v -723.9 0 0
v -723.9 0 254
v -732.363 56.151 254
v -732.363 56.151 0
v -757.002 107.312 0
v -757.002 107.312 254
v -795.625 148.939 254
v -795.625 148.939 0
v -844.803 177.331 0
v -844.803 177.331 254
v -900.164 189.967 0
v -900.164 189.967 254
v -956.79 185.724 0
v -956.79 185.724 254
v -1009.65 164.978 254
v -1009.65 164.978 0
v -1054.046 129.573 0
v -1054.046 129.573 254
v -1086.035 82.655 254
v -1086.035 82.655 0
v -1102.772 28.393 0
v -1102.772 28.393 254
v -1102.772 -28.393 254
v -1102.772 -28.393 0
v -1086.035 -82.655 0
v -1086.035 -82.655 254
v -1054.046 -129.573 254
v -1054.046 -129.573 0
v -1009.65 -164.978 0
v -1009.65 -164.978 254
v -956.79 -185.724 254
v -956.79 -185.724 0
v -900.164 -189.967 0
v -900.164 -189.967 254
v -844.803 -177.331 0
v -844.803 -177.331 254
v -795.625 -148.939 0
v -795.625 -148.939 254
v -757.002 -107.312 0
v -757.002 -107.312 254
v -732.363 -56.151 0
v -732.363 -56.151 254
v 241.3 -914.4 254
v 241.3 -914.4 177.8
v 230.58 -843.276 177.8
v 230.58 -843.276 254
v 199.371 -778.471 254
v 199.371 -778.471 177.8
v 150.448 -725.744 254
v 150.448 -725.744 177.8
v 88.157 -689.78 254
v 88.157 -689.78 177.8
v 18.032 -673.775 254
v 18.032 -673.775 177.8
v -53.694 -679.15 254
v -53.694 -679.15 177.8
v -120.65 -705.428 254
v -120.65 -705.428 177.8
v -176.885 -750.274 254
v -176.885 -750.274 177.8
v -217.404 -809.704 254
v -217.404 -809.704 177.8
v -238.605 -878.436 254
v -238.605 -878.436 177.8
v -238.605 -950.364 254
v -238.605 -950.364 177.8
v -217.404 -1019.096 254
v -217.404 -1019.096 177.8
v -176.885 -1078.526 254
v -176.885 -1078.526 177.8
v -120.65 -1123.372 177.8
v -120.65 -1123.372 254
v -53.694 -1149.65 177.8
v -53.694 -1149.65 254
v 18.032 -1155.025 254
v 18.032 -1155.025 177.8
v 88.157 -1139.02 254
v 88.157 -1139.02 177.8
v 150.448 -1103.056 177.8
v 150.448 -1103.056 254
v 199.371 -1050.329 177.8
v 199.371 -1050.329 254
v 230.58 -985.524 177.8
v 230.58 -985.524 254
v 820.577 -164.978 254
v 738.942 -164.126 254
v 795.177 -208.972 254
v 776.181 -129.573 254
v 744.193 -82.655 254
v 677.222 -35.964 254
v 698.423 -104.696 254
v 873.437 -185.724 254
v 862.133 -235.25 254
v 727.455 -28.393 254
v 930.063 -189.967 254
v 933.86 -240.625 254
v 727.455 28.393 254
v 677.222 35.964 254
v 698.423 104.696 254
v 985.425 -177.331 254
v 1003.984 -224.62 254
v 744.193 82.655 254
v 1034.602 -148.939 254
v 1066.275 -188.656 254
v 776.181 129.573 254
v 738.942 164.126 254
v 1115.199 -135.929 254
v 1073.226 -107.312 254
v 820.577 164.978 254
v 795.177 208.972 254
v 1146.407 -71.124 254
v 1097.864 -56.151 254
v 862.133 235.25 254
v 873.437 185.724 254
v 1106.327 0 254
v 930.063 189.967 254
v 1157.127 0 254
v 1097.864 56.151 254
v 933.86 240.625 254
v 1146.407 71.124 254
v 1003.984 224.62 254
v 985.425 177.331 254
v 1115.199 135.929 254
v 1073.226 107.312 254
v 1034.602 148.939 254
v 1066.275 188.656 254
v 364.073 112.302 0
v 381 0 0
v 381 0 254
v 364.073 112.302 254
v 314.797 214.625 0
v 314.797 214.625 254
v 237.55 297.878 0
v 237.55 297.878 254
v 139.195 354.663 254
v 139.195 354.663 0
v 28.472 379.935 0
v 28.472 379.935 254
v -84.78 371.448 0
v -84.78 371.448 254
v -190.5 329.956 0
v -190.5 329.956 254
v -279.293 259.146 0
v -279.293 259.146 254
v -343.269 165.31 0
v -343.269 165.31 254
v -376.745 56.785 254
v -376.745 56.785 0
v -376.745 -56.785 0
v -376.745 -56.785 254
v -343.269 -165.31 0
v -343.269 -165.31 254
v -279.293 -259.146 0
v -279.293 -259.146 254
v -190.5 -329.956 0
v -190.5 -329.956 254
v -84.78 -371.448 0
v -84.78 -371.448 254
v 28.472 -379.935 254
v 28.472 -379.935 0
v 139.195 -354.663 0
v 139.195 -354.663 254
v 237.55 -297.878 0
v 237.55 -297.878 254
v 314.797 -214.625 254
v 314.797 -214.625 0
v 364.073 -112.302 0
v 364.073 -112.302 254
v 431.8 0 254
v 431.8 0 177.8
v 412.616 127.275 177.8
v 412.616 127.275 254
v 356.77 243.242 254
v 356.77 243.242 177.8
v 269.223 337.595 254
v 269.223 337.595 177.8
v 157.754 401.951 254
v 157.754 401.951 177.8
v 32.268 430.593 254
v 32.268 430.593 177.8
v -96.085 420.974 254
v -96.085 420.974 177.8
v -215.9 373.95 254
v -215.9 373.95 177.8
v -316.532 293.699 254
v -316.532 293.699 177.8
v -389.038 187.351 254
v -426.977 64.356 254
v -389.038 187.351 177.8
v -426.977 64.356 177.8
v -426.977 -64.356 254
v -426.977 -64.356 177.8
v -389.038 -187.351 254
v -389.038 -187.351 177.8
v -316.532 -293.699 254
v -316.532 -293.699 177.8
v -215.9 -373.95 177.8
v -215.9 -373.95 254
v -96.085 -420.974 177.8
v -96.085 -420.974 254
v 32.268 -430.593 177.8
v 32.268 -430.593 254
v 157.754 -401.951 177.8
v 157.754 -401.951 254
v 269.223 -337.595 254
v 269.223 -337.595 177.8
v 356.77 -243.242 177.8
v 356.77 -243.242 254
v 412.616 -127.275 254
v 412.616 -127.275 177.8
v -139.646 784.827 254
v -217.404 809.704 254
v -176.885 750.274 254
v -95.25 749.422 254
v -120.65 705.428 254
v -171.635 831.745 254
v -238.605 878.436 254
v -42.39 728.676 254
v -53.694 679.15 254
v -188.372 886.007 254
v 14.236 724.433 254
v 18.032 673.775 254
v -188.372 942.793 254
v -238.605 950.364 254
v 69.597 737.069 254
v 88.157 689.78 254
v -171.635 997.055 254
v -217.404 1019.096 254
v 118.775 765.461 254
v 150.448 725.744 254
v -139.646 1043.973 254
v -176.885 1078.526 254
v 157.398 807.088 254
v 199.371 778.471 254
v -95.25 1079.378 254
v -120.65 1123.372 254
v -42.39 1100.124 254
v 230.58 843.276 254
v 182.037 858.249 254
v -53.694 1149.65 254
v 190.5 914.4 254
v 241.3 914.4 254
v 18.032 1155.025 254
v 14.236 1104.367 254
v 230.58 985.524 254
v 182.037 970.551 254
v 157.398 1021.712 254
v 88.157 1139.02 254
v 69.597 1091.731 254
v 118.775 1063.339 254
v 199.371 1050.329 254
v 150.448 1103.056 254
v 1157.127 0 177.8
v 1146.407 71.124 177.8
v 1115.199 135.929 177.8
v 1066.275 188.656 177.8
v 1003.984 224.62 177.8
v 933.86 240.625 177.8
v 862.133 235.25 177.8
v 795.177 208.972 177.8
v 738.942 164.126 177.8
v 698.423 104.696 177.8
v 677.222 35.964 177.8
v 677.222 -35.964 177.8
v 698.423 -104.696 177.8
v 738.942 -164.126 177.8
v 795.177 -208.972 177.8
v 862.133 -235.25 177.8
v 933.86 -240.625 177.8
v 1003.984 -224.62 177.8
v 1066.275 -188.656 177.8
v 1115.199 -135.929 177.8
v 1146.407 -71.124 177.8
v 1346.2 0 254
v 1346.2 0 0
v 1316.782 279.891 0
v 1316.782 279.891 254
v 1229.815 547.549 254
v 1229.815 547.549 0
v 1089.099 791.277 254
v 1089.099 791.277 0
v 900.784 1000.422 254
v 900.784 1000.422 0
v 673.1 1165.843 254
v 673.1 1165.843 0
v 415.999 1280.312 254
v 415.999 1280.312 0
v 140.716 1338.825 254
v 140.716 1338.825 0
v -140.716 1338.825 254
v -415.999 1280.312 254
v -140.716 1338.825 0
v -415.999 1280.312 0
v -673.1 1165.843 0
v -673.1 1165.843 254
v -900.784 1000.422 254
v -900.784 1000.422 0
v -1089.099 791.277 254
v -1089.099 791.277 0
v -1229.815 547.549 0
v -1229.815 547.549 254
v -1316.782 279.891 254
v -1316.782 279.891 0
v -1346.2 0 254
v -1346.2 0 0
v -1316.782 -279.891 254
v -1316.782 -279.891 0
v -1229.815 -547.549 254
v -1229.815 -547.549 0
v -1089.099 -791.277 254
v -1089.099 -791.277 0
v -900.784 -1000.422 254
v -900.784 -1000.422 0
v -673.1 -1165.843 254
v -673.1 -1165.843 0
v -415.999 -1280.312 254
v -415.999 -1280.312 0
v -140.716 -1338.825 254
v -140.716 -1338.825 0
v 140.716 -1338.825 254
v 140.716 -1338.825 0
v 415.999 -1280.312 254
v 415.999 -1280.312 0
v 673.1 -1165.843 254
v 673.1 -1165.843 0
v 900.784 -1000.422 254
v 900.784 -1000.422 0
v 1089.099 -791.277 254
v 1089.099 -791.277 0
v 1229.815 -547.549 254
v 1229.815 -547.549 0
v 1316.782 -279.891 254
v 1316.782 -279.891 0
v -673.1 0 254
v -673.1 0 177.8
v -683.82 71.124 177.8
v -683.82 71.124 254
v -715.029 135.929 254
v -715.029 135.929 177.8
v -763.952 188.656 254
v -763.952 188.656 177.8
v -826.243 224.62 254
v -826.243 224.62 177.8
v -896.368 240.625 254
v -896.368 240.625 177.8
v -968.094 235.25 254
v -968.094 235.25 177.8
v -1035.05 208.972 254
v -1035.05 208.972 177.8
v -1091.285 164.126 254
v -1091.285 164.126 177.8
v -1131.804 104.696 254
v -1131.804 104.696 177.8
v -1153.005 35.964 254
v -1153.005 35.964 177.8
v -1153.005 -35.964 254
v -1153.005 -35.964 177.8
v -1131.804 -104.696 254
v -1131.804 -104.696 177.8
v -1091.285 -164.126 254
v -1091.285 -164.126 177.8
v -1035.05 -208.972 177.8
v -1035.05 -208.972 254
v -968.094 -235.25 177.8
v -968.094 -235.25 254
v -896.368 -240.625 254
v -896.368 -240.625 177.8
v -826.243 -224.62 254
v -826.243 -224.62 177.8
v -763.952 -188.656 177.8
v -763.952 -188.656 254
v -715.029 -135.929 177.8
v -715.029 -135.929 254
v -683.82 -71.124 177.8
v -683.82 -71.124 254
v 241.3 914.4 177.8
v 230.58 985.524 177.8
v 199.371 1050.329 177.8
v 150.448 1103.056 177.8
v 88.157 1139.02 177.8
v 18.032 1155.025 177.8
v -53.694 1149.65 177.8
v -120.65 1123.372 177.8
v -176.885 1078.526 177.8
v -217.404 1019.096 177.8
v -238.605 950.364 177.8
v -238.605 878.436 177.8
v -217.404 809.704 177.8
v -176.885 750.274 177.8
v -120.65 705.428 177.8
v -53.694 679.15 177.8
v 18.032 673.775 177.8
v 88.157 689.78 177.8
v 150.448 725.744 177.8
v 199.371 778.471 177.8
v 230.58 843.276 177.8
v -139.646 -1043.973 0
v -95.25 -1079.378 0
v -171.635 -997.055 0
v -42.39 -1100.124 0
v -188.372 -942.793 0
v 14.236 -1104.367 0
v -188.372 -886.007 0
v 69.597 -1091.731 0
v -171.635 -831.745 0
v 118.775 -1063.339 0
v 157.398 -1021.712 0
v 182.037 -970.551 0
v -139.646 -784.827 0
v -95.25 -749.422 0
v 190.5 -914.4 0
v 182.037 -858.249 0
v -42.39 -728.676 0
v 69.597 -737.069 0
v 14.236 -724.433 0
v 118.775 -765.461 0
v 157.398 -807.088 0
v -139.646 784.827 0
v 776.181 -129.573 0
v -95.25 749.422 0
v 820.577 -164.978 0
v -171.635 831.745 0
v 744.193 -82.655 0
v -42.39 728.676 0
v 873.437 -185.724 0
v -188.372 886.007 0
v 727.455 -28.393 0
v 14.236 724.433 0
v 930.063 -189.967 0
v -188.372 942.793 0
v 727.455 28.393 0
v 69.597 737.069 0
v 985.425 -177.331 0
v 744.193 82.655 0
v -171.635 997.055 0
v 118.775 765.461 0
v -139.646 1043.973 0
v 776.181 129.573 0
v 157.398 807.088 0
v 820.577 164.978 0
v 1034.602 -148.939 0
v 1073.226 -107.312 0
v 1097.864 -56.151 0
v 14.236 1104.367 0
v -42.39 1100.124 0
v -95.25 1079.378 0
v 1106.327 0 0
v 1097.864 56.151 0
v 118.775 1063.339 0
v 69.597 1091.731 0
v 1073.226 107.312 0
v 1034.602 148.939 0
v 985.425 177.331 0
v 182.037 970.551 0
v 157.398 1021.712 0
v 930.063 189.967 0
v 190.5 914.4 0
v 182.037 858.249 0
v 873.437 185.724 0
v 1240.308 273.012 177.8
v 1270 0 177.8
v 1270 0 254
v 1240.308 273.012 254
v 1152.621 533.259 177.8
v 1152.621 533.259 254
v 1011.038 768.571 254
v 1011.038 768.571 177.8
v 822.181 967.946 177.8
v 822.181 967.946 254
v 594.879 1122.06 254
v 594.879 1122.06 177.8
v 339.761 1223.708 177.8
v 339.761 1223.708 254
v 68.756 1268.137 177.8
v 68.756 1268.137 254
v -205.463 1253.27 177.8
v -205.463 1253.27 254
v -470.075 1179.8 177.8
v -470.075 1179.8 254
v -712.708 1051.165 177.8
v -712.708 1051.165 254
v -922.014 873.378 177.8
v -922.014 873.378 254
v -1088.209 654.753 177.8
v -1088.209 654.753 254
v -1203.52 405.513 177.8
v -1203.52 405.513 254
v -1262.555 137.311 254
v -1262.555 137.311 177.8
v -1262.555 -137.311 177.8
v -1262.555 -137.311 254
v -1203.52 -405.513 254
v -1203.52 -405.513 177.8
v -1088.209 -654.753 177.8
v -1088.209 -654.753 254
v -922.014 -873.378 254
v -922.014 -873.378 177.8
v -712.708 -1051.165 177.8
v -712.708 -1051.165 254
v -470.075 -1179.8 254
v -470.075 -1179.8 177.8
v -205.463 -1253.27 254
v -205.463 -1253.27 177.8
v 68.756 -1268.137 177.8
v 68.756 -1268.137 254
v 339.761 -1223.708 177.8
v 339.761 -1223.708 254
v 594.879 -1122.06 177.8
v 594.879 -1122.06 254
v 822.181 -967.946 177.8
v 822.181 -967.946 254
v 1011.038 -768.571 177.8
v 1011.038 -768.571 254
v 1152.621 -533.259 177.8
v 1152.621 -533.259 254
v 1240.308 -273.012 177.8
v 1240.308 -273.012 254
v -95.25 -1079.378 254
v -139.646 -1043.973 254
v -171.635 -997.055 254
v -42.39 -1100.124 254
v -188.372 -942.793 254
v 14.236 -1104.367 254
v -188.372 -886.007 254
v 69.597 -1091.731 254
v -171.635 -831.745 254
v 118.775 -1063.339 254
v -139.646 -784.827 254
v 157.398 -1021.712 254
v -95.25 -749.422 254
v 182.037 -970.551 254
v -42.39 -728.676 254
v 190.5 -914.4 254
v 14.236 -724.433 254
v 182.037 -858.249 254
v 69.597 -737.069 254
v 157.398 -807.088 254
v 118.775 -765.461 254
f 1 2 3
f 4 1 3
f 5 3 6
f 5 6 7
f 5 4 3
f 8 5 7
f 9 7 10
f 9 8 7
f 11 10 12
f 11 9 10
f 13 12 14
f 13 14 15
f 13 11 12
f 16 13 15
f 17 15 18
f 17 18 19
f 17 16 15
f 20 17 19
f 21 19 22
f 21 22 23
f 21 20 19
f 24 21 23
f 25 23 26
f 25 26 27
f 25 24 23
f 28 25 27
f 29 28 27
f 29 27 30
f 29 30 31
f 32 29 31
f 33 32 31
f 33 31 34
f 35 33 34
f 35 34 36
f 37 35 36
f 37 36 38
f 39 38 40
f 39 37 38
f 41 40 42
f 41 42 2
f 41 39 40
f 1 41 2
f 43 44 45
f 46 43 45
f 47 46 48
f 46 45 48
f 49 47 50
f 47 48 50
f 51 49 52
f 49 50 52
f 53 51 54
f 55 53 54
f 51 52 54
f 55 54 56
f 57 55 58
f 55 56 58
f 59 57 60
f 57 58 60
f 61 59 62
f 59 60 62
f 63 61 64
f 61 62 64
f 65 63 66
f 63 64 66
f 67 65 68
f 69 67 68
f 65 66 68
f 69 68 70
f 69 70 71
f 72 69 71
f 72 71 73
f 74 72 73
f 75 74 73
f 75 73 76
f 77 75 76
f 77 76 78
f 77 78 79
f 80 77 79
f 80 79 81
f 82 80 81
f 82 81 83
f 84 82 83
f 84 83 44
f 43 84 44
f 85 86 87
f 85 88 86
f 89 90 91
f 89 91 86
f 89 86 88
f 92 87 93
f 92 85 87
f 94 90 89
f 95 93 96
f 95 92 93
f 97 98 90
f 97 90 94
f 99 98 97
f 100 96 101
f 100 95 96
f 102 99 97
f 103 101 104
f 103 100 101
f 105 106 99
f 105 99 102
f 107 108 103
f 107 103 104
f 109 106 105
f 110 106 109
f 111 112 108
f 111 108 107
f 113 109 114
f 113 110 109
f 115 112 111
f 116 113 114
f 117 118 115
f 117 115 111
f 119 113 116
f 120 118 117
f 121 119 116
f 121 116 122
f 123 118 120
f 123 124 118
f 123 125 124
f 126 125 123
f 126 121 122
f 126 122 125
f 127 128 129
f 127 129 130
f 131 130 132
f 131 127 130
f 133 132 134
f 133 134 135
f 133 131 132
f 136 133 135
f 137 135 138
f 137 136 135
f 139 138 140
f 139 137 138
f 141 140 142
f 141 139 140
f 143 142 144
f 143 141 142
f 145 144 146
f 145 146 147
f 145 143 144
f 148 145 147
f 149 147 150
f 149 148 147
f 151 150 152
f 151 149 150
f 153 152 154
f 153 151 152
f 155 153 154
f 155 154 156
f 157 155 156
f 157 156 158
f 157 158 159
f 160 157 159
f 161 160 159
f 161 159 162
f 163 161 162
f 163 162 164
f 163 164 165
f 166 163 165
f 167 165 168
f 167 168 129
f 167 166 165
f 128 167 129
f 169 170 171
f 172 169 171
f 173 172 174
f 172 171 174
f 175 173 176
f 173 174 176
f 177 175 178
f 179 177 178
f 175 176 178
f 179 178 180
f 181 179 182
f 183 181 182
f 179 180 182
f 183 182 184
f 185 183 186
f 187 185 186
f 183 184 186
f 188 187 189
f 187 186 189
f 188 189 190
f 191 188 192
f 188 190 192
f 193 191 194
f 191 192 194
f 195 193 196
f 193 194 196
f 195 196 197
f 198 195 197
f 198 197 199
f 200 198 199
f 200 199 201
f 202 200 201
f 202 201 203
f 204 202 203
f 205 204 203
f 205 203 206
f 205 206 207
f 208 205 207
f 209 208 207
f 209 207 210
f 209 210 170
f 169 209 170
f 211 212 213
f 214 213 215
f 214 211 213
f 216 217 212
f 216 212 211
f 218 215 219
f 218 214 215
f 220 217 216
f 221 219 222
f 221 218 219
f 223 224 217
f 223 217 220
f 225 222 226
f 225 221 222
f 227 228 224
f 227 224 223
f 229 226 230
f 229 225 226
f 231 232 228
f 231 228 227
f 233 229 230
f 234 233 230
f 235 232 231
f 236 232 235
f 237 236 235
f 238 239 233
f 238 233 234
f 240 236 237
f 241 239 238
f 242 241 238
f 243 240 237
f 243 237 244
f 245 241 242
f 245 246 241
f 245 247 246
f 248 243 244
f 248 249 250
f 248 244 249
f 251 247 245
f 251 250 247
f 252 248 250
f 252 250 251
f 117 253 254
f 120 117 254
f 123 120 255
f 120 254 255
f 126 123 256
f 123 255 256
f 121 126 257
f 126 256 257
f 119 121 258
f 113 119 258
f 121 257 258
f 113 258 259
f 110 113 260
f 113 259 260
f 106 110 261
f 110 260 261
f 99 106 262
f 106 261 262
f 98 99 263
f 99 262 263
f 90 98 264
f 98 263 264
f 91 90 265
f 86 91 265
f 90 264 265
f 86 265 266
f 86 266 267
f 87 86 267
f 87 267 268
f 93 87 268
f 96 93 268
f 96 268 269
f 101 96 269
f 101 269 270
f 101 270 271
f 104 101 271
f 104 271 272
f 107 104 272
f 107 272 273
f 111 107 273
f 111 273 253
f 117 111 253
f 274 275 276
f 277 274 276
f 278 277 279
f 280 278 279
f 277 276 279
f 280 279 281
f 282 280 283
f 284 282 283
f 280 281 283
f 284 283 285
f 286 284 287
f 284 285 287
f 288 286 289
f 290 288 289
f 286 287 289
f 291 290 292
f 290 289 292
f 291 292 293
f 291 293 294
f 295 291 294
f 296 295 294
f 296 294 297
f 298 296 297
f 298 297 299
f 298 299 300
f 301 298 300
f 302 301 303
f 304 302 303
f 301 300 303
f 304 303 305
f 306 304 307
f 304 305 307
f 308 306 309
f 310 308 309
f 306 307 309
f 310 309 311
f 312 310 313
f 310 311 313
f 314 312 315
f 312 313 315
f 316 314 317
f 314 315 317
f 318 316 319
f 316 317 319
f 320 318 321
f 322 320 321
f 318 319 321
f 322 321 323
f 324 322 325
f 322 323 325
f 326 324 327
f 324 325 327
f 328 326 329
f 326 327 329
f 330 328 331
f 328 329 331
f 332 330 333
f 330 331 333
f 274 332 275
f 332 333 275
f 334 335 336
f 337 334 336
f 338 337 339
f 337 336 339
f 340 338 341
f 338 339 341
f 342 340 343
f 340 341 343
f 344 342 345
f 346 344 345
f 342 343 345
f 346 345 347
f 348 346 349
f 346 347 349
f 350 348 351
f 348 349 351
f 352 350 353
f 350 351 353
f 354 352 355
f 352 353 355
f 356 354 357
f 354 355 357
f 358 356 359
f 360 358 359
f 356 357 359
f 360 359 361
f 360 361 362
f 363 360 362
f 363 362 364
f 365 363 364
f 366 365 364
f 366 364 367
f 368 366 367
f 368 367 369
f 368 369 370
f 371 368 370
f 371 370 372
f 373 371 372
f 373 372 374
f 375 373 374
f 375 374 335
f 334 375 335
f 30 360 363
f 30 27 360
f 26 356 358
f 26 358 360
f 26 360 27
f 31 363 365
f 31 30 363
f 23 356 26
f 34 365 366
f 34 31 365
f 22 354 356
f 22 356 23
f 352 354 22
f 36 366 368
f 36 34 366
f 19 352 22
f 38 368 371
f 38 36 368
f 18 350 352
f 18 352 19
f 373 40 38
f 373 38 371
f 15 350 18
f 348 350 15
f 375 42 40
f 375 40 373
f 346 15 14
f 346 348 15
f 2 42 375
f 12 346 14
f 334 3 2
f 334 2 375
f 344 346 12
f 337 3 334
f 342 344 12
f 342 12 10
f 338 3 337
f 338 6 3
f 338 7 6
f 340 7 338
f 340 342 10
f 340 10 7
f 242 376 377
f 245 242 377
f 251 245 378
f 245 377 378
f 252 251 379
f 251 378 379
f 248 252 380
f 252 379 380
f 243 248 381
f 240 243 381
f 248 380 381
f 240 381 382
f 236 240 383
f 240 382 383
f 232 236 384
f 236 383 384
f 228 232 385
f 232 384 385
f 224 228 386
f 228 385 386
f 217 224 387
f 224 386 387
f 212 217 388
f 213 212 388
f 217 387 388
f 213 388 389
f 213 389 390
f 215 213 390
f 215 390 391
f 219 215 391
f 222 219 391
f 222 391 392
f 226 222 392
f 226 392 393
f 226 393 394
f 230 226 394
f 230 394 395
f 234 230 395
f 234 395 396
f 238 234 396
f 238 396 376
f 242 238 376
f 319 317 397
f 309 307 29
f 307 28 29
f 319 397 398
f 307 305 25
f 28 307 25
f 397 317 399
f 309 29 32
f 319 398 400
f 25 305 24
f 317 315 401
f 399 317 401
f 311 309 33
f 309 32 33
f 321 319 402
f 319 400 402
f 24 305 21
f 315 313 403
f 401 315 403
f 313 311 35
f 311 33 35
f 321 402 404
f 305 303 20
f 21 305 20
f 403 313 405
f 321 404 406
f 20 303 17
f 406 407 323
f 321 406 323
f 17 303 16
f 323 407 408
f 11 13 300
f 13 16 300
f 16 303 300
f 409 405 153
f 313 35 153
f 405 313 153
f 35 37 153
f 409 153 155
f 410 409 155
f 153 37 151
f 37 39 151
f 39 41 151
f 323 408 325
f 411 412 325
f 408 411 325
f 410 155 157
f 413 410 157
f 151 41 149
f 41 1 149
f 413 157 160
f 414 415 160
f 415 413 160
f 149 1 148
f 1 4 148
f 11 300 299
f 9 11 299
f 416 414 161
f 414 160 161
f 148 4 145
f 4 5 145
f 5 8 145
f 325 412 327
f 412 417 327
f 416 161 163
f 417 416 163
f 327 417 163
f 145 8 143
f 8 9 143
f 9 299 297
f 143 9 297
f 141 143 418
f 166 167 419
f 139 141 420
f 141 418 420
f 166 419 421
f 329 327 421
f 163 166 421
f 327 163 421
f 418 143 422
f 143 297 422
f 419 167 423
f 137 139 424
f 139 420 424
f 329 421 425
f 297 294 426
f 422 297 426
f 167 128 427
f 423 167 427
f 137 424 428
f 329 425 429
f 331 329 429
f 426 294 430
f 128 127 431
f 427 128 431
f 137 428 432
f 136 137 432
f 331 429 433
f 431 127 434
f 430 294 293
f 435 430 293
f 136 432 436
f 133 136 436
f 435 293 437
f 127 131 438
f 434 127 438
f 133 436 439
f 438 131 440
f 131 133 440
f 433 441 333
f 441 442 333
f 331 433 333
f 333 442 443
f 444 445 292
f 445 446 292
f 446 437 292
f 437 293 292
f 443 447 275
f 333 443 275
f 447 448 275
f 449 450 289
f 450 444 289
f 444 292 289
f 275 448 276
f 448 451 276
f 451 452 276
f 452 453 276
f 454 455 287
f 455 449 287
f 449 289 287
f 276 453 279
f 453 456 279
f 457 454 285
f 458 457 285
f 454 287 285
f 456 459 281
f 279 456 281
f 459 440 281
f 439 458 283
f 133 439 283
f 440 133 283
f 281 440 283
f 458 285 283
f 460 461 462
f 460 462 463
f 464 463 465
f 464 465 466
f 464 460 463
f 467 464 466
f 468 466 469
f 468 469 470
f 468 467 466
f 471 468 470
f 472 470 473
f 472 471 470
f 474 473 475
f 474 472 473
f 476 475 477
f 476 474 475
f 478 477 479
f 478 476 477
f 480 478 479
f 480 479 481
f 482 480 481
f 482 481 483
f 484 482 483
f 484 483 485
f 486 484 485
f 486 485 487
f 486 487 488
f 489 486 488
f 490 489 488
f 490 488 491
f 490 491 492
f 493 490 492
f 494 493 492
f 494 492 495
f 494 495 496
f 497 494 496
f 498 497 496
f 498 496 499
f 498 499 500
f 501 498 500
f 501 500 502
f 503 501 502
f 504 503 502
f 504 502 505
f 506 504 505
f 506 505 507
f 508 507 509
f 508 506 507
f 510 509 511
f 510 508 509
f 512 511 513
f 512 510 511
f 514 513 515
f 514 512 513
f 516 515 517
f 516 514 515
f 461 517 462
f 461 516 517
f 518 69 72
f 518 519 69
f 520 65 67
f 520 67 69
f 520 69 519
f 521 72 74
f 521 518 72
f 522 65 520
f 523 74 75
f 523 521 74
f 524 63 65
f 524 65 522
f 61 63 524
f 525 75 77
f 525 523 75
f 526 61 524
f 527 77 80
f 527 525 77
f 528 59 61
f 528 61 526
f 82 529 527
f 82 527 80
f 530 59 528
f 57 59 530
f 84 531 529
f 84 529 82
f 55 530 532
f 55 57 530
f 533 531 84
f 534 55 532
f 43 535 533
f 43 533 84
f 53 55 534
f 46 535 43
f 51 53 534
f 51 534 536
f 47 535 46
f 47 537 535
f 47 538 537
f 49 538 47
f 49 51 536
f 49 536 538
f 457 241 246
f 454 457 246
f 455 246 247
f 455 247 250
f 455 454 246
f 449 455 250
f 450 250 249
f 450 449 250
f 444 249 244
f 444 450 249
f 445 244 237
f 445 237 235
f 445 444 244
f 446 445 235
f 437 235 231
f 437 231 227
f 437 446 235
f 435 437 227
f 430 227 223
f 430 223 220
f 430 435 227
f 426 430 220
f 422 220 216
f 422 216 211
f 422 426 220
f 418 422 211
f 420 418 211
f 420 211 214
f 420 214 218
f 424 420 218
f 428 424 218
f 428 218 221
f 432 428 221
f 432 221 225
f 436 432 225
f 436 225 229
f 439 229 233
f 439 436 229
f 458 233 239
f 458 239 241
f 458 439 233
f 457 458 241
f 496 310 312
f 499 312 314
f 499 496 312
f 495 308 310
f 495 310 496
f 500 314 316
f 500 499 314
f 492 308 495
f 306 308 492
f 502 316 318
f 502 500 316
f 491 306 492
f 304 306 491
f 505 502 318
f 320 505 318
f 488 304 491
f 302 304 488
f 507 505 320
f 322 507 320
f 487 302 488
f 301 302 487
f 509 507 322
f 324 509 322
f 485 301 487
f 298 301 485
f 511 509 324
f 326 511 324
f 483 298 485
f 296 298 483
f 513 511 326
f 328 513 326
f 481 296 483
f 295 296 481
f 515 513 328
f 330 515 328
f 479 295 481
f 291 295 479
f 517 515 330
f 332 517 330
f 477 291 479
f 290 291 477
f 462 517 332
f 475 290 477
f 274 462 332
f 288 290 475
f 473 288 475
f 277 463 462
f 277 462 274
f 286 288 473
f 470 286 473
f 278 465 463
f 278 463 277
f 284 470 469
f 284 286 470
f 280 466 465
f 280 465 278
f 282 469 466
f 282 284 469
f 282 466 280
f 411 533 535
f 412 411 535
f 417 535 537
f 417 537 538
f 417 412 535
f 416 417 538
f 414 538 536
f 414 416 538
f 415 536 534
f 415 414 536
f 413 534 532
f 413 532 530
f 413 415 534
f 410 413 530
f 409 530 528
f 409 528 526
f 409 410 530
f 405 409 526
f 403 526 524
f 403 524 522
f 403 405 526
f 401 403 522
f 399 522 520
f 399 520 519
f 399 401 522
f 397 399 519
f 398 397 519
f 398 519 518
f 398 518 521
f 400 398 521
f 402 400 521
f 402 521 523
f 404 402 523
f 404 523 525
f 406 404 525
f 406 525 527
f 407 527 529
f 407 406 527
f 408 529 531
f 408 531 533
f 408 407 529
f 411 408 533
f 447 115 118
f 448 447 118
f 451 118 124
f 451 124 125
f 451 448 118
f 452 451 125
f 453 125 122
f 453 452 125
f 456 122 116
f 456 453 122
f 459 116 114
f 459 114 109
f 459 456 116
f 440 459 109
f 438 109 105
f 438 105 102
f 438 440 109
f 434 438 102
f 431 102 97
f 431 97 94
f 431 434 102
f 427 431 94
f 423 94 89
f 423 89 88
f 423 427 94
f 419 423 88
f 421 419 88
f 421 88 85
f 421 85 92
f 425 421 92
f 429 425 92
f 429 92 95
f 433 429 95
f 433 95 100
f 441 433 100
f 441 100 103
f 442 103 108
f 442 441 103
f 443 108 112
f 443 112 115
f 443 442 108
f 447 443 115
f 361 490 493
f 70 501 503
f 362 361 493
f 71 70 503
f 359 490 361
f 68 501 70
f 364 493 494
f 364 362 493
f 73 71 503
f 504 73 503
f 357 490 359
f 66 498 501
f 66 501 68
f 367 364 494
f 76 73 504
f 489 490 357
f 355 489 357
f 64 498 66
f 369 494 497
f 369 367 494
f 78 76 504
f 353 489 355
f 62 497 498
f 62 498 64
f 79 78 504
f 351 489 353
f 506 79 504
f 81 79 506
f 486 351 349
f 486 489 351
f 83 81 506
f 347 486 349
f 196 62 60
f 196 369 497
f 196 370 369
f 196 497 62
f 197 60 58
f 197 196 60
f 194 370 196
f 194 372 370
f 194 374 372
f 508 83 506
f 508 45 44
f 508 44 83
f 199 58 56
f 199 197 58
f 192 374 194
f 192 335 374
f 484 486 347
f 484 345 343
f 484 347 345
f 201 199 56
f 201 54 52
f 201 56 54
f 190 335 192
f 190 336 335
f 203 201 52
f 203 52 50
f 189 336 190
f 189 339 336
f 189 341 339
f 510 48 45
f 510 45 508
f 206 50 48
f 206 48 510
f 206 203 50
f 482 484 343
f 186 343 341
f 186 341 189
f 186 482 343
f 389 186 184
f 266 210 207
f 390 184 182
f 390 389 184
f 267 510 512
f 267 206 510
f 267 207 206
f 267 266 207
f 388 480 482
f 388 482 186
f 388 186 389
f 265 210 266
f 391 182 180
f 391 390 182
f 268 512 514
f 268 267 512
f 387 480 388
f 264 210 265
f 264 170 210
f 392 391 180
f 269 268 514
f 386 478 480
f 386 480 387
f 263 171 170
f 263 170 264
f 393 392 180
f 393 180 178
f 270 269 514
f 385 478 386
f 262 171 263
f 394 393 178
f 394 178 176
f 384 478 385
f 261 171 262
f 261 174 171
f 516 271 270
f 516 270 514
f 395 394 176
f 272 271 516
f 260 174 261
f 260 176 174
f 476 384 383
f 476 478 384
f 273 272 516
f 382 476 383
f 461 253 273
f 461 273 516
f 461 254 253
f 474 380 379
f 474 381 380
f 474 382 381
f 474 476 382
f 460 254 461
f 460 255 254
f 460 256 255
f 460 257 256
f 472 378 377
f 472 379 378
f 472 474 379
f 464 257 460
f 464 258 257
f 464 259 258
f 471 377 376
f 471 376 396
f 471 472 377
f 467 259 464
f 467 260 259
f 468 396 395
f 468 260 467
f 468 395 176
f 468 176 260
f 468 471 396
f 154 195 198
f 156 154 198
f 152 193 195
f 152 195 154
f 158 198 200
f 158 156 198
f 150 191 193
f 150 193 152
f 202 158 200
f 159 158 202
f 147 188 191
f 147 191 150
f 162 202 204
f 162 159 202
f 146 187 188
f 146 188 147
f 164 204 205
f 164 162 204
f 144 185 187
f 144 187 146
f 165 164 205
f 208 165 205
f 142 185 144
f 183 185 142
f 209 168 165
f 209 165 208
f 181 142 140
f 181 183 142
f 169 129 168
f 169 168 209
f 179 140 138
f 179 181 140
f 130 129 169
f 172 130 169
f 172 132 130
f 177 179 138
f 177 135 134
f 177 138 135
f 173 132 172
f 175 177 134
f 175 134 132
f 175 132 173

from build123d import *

# Parameters (mm, degrees)
F0_R     = 1270
F0_R_2   = 241.3
F0_R_3   = 431.8
F1_DEPTH = 177.8
F0_R_4   = 190.5
F2_DEPTH = 254
F0_R_5   = 381
F3_DEPTH = 254
F0_R_6   = 1346.2
F4_DEPTH = 254


with BuildPart() as f1:
    # F0 (on Top) → F1 (new body)
    with BuildSketch(Plane.XY):
        Circle(F0_R)
        with Locations((0, -914.399981)):
            Circle(F0_R_2, mode=Mode.SUBTRACT)
        with Locations((-914.4, 0)):
            Circle(F0_R_2, mode=Mode.SUBTRACT)
        Circle(F0_R_3, mode=Mode.SUBTRACT)
        with Locations((915.827215, 0)):
            Circle(F0_R_2, mode=Mode.SUBTRACT)
        with Locations((0, 914.4)):
            Circle(F0_R_2, mode=Mode.SUBTRACT)
    extrude(amount=F1_DEPTH)

    # F0 (on Top) → F2 (join)
    with BuildSketch(Plane.XY):
        with Locations((0, 914.4)):
            Circle(F0_R_2)
        with Locations((0, 914.4)):
            Circle(F0_R_4, mode=Mode.SUBTRACT)
        with Locations((915.827215, 0)):
            Circle(F0_R_2)
        with Locations((915.827215, 0)):
            Circle(F0_R_4, mode=Mode.SUBTRACT)
        with Locations((0, -914.399981)):
            Circle(F0_R_2)
        with Locations((0, -914.399981)):
            Circle(F0_R_4, mode=Mode.SUBTRACT)
        with Locations((-914.4, 0)):
            Circle(F0_R_2)
        with Locations((-914.4, 0)):
            Circle(F0_R_4, mode=Mode.SUBTRACT)
    extrude(amount=F2_DEPTH)

    # F0 (on Top) → F3 (join)
    with BuildSketch(Plane.XY):
        Circle(F0_R_3)
        Circle(F0_R_5, mode=Mode.SUBTRACT)
    extrude(amount=F3_DEPTH)

    # F0 (on Top) → F4 (join)
    with BuildSketch(Plane.XY):
        Circle(F0_R_6)
        Circle(F0_R, mode=Mode.SUBTRACT)
    extrude(amount=F4_DEPTH)


solid = f1.part
